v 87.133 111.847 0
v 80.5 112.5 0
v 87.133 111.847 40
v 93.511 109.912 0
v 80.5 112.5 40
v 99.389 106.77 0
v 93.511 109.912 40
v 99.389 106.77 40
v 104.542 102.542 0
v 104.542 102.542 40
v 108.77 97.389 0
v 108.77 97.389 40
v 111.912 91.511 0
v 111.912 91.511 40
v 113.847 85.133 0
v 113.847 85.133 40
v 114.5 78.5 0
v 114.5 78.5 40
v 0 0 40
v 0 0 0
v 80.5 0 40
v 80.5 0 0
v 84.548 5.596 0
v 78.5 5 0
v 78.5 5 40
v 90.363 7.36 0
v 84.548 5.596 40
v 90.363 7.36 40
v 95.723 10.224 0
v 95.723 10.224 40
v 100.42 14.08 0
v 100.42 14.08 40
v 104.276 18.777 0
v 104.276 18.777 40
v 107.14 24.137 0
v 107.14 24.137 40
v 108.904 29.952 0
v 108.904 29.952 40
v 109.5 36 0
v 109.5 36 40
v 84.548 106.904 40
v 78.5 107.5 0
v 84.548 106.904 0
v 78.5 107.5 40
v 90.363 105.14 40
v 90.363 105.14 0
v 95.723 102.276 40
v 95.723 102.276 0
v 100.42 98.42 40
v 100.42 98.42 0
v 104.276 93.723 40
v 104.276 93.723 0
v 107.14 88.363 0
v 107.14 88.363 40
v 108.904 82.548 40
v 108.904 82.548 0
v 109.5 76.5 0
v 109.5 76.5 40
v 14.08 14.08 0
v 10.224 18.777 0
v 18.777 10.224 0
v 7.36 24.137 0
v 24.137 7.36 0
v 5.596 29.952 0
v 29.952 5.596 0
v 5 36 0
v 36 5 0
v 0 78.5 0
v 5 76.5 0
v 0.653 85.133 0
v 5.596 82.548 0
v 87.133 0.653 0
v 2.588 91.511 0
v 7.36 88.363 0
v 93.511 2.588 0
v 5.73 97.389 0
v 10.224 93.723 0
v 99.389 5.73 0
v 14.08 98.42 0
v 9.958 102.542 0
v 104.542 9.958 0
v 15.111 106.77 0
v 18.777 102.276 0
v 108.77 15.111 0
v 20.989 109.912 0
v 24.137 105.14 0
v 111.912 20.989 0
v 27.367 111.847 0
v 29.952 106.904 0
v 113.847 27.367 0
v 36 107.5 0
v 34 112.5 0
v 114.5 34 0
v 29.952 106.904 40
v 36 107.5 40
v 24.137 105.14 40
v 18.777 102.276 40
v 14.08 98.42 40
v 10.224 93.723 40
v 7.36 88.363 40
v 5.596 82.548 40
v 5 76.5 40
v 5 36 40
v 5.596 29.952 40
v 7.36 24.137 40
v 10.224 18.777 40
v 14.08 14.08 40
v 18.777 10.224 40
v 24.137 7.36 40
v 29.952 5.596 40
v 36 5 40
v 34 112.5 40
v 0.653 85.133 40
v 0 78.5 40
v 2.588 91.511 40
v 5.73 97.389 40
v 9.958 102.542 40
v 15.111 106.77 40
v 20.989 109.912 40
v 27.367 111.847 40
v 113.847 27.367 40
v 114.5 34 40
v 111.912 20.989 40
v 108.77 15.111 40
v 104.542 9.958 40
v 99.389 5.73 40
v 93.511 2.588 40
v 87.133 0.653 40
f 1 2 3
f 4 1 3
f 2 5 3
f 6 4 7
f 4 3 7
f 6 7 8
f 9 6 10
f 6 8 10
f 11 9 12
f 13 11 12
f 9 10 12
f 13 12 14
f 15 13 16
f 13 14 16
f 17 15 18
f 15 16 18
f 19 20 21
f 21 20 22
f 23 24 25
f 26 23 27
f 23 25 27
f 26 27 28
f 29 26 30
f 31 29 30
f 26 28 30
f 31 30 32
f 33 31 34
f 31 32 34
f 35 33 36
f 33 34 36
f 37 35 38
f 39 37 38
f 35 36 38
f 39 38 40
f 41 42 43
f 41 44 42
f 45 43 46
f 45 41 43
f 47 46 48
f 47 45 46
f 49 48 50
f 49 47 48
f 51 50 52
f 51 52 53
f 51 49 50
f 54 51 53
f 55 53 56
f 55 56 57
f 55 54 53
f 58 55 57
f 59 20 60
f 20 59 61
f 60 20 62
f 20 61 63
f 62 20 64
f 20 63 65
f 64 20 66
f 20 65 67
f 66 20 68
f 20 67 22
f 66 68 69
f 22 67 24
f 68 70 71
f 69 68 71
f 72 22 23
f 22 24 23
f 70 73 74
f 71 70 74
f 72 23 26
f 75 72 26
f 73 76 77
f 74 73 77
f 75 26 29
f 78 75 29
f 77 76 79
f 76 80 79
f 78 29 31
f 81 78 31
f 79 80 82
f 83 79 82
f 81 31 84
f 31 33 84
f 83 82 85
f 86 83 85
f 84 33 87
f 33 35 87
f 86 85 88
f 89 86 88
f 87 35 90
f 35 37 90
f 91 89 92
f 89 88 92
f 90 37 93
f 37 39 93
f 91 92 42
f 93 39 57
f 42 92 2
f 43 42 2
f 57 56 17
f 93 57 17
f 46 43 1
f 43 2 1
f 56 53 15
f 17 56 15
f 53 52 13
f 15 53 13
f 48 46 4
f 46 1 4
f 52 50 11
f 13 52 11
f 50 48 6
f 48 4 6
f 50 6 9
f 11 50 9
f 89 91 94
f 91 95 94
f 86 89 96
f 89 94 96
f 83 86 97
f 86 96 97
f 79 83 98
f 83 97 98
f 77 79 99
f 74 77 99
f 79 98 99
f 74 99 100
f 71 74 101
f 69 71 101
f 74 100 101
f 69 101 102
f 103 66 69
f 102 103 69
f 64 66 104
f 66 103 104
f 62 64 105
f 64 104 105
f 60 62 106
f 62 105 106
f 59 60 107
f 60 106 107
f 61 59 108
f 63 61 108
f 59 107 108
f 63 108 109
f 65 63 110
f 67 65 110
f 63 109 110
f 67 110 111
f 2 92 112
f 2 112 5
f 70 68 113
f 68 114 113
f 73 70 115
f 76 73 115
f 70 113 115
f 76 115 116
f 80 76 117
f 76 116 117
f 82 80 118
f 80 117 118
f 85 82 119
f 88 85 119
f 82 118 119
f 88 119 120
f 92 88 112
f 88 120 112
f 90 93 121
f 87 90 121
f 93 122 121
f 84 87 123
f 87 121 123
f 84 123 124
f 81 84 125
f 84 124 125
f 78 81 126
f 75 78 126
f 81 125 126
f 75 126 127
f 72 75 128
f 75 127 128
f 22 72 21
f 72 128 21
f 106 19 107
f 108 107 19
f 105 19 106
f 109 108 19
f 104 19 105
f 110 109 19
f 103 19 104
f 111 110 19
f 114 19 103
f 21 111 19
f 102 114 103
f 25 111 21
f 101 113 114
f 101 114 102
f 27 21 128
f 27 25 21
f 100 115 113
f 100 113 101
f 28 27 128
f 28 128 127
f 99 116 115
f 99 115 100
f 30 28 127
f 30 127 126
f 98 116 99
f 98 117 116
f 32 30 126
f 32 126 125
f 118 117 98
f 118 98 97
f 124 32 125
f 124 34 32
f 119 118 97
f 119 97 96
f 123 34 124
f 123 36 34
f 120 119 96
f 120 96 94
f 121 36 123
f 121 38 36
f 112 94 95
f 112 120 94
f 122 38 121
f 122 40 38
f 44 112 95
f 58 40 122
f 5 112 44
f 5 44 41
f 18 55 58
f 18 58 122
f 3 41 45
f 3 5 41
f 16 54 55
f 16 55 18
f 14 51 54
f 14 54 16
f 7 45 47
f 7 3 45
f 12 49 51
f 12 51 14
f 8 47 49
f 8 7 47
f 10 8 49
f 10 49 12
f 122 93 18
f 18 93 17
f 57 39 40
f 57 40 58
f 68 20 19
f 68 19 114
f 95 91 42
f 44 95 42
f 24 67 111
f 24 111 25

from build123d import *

# Parameters (mm, degrees)
BOX001_W     = 104.5
BOX001_H     = 102.5
BOX001_DEPTH = 42
BOX_W        = 114.5
BOX_H        = 112.5
BOX_DEPTH    = 40
FILLET_R     = 31
FILLET001_R  = 31
FILLET002_R  = 31
FILLET003_R  = 31
FILLET004_R  = 34
FILLET005_R  = 34
FILLET006_R  = 34


with BuildPart() as cubo001:
    # Box001 → Box001 (new body)
    with BuildSketch(Plane(origin=(5, 5, 0), x_dir=(1, 0, 0), z_dir=(0, 0, 1))):
        with Locations((52.25, 51.25)):
            Rectangle(BOX001_W, BOX001_H)
    extrude(amount=BOX001_DEPTH)


with BuildPart() as fillet006:
    # Box → Box (new body)
    with BuildSketch(Plane.XY):
        with Locations((57.25, 56.25)):
            Rectangle(BOX_W, BOX_H)
    extrude(amount=BOX_DEPTH)

    # Cut: cut Cubo001
    add(cubo001.part, mode=Mode.SUBTRACT)

    # Fillet
    fillet_edges = [fillet006.edges().sort_by_distance(p)[0] for p in [
        (5, 107.5, 20),
    ]]
    fillet(fillet_edges, radius=FILLET_R)

    # Fillet001
    fillet001_edges = [fillet006.edges().sort_by_distance(p)[0] for p in [
        (109.5, 107.5, 20),
    ]]
    fillet(fillet001_edges, radius=FILLET001_R)

    # Fillet002
    fillet002_edges = [fillet006.edges().sort_by_distance(p)[0] for p in [
        (5, 5, 20),
    ]]
    fillet(fillet002_edges, radius=FILLET002_R)

    # Fillet003
    fillet003_edges = [fillet006.edges().sort_by_distance(p)[0] for p in [
        (109.5, 5, 20),
    ]]
    fillet(fillet003_edges, radius=FILLET003_R)

    # Fillet004
    fillet004_edges = [fillet006.edges().sort_by_distance(p)[0] for p in [
        (0, 112.5, 20),
    ]]
    fillet(fillet004_edges, radius=FILLET004_R)

    # Fillet005
    fillet005_edges = [fillet006.edges().sort_by_distance(p)[0] for p in [
        (114.5, 112.5, 20),
    ]]
    fillet(fillet005_edges, radius=FILLET005_R)

    # Fillet006
    fillet006_edges = [fillet006.edges().sort_by_distance(p)[0] for p in [
        (114.5, 0, 20),
    ]]
    fillet(fillet006_edges, radius=FILLET006_R)


solid = fillet006.part
